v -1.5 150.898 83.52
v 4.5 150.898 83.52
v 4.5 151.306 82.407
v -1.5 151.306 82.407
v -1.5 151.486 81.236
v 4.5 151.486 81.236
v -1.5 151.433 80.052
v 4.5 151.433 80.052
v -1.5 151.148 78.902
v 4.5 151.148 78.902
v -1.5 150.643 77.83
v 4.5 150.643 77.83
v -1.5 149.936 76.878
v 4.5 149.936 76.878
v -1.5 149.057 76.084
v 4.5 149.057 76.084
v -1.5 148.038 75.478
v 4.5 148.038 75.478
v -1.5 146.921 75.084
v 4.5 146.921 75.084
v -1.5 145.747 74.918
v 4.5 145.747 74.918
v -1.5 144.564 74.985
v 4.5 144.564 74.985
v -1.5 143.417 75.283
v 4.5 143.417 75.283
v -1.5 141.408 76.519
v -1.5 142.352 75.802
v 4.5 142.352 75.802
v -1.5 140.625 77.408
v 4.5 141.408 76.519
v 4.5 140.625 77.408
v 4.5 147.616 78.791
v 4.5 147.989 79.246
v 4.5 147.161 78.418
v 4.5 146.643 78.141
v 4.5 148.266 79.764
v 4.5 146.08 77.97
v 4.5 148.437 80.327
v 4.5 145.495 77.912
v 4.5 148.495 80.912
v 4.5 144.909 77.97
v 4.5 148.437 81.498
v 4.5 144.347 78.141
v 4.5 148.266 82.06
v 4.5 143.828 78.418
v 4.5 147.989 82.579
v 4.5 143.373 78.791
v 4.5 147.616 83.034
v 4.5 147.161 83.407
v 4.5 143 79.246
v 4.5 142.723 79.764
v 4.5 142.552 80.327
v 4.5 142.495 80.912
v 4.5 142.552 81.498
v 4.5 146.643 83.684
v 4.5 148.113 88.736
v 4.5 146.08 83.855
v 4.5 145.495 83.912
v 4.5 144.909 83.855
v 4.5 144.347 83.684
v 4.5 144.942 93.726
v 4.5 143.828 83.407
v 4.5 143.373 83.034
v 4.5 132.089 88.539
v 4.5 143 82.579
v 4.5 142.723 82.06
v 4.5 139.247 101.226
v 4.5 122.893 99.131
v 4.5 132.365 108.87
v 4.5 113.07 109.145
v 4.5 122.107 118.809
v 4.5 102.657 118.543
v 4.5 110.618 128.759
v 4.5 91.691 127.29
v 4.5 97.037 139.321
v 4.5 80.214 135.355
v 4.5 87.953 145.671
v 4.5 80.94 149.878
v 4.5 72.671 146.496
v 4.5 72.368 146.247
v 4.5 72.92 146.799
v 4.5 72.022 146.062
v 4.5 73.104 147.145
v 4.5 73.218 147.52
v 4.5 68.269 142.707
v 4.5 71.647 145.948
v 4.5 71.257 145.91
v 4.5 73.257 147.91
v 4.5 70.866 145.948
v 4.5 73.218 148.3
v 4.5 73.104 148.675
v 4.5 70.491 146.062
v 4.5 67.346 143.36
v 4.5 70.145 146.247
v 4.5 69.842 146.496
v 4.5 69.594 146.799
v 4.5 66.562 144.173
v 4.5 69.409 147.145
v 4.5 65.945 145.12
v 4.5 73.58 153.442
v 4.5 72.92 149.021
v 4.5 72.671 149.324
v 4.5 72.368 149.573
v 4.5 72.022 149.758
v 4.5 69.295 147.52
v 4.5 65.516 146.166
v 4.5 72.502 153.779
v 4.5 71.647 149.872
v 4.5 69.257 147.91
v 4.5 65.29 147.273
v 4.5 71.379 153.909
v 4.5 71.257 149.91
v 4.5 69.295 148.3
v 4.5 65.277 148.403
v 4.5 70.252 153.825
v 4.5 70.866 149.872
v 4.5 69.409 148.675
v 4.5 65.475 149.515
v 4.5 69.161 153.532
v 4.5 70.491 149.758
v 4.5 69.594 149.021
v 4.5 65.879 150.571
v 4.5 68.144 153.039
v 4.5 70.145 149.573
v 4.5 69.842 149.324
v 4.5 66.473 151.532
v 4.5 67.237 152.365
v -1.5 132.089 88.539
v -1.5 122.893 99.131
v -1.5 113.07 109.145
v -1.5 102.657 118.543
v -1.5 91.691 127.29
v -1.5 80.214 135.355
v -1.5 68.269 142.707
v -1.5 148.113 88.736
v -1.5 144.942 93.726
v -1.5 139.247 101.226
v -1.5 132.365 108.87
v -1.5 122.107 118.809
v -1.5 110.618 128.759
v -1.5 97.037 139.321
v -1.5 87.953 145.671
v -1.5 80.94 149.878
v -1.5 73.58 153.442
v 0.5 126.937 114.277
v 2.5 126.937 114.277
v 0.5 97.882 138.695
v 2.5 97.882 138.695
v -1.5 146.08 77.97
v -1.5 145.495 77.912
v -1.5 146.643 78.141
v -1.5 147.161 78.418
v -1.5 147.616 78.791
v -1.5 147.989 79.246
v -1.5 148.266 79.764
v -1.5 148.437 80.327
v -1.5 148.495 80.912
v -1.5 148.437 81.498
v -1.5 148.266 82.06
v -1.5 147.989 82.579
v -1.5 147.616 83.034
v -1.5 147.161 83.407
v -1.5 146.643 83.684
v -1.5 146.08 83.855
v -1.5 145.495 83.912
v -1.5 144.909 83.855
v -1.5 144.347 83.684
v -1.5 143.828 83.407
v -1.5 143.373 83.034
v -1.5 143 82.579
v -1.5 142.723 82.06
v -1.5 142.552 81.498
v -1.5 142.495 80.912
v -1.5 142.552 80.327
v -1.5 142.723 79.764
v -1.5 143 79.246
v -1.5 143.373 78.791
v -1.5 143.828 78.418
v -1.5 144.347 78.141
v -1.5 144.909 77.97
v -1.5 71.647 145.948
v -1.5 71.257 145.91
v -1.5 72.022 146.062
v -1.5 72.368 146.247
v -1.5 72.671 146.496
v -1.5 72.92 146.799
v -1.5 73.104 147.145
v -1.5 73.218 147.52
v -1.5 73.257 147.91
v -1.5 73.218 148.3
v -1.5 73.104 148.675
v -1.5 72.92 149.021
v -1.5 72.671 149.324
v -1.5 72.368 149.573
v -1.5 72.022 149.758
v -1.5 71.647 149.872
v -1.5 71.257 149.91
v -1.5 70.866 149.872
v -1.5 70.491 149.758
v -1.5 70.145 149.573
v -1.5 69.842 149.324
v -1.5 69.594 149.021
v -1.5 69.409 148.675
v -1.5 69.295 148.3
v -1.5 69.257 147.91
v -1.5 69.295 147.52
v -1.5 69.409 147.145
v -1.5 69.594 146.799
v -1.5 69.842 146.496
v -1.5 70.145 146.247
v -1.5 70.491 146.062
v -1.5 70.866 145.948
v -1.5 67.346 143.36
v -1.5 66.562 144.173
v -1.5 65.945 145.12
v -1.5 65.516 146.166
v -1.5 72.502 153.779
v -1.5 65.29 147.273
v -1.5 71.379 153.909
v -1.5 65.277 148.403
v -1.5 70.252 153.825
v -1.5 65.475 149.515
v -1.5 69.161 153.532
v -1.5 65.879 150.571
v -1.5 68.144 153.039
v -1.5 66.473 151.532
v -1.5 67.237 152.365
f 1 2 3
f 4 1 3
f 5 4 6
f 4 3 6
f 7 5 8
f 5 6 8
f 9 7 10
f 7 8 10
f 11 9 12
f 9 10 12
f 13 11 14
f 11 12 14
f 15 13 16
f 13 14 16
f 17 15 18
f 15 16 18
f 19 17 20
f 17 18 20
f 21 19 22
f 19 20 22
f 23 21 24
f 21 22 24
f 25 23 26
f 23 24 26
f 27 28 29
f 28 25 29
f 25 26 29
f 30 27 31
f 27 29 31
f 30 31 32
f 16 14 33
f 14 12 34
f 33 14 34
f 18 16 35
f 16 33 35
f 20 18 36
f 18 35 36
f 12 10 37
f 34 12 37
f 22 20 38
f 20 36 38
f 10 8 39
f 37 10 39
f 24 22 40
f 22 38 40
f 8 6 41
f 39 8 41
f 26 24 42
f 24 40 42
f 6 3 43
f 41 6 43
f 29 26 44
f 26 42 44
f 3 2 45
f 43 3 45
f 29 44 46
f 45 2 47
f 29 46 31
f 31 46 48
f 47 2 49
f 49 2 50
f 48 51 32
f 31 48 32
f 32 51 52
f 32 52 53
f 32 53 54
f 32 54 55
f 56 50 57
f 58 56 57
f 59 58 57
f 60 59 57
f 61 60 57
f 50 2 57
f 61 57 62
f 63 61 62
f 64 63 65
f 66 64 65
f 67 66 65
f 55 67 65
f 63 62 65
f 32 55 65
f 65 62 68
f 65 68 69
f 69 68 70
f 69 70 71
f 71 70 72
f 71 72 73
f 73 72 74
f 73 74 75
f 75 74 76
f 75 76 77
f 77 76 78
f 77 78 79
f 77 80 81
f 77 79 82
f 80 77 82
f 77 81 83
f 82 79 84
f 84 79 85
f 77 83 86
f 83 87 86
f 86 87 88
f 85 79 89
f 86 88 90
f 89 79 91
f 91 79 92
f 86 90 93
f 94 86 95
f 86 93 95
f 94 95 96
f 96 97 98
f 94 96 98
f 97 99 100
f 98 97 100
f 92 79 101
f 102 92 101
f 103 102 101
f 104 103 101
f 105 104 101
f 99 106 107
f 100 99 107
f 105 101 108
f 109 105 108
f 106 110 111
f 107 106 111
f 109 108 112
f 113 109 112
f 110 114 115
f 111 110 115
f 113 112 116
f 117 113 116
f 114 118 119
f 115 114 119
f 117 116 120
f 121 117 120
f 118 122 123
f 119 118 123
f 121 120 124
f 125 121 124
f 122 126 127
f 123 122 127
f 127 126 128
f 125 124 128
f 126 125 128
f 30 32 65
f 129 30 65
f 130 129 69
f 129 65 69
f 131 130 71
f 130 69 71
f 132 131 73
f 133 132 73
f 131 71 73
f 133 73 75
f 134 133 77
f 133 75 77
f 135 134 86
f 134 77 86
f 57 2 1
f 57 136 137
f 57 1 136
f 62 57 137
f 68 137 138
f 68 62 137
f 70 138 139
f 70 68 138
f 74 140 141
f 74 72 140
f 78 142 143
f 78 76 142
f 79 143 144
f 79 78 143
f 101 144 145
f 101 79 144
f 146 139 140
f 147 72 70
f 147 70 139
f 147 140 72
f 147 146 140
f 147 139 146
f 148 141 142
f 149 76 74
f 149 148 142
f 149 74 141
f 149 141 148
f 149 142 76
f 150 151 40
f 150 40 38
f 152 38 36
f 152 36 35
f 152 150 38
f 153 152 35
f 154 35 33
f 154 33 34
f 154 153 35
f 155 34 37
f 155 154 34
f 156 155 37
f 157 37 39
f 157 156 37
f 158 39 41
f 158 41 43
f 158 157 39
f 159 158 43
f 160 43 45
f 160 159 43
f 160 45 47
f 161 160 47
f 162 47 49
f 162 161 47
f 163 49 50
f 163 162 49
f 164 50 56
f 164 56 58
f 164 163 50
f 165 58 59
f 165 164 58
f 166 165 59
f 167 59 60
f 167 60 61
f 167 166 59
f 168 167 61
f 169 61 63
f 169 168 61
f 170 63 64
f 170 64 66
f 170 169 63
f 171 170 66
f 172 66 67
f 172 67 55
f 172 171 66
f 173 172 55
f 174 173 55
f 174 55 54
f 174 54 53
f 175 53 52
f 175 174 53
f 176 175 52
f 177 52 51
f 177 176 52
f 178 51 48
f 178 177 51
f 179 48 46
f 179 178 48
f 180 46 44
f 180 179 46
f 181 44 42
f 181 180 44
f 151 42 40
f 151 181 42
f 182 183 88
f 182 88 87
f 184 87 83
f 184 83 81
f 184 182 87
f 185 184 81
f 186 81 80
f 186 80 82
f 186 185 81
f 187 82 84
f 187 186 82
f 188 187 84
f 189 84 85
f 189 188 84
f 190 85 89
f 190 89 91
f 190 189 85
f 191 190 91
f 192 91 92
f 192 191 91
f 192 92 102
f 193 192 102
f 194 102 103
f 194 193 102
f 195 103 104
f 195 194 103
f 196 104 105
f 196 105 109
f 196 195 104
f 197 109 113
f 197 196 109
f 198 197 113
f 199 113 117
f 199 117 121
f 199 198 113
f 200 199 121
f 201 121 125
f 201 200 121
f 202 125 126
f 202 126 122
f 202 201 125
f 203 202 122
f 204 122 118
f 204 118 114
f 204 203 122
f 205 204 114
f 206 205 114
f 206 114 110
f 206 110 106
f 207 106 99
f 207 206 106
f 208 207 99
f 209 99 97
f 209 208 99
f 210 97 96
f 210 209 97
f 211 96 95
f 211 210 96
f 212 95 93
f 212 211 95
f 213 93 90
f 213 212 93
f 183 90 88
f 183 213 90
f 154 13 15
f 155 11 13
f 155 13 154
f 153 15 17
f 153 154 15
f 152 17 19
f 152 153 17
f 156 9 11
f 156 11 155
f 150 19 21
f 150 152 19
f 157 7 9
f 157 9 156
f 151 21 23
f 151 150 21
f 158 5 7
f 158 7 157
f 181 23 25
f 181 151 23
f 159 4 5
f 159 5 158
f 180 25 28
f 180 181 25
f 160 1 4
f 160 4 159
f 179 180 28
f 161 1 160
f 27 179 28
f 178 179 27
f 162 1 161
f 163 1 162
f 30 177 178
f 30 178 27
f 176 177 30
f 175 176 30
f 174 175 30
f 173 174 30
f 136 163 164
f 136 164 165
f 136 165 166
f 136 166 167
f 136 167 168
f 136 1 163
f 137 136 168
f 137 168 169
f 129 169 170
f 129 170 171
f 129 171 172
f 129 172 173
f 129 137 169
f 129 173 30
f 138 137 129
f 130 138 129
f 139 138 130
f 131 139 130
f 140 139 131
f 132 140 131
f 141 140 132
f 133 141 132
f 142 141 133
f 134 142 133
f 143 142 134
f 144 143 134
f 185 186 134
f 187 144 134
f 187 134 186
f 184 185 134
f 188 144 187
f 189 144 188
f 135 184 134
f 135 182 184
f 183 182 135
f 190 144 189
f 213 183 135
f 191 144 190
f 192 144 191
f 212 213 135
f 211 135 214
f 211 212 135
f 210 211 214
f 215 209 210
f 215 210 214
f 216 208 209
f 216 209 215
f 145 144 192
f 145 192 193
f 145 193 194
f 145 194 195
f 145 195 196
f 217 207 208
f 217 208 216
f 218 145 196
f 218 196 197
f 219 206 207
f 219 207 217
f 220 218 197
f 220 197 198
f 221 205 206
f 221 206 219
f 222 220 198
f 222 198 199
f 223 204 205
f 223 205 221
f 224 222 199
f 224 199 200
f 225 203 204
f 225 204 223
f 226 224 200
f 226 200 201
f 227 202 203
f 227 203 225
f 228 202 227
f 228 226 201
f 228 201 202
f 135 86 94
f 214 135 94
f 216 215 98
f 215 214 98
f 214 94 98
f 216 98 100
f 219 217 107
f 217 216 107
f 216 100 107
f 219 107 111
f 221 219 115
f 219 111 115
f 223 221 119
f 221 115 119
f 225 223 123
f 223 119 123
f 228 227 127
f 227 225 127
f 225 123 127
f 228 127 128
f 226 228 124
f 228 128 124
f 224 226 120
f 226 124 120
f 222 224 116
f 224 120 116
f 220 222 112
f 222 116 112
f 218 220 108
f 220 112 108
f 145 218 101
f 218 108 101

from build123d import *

# Parameters (mm, degrees)
SKETCH3_R               = 1.5
SKETCH3_R_2             = 1
BOSS_EXTRUDE2_DEPTH     = 3
SCALE1_SCALE            = 2
CUT_EXTRUDE1_DEPTH      = 236.835290083
CUT_EXTRUDE1_DEPTH_BACK = 236.835290083


with BuildPart() as part:
    # Sketch3 → Boss-Extrude2 (new body)
    with BuildSketch(Plane.YZ):
        with BuildLine():
            ThreePointArc((118.150026657, 100.656257205), (107.173519636, 113.210773098), (93.56234312, 122.845888539))
            ThreePointArc((93.56234312, 122.845888539), (81.890744338, 136.842623997), (100.108836706, 136.356895566))
            ThreePointArc((100.108836706, 136.356895566), (117.223173705, 124.346501771), (130.920746245, 108.550090897))
            ThreePointArc((130.920746245, 108.550090897), (133.266943269, 90.477177984), (118.150026657, 100.656257205))
        make_face()
        with Locations(Location((128.009104434, 98.9833599, 0), (0, 0, 270))):
            Circle(SKETCH3_R, mode=Mode.SUBTRACT)
        with Locations(Location((90.890008855, 132.482206797, 0), (0, 0, 270))):
            Circle(SKETCH3_R_2, mode=Mode.SUBTRACT)
    extrude(amount=BOSS_EXTRUDE2_DEPTH)


with BuildPart() as part_1:
    # Scale1: scaled about (1.5, 110.52343824, 117.054422993)
    add(part.part.scale(SCALE1_SCALE).moved(Location((-1.5, -110.52343824, -117.054422993))))

    # Sketch4 → Cut-Extrude1 (cut, two sides: drawn at the far end of the back side and taken through both)
    # profile 1 of 2: a face of its own
    with BuildSketch(Plane(origin=(-1.5, 0, 0), x_dir=(0, -1, 0), z_dir=(-1, 0, 0)).offset(-CUT_EXTRUDE1_DEPTH_BACK)):
        with BuildLine():
            ThreePointArc((-97.213316268, 162.951526918), (-130.622678549, 139.062399665), (-157.803069224, 108.271130585))
            ThreePointArc((-157.803069224, 108.271130585), (-161.544389081, 55.566493456), (-115.500216043, 81.48386945))
            ThreePointArc((-115.500216043, 81.48386945), (-97.123831652, 101.943304086), (-74.892452954, 118.131131925))
            ThreePointArc((-74.892452954, 118.131131925), (-44.402388035, 161.28356164), (-97.213316268, 162.951526918))
        make_face()
        with BuildLine():
            ThreePointArc((-125.776615074, 84.258091416), (-103.823601031, 109.367123202), (-76.601248, 128.637354084))
            ThreePointArc((-76.601248, 128.637354084), (-53.258050437, 156.630825002), (-89.694235172, 155.659368138))
            ThreePointArc((-89.694235172, 155.659368138), (-123.922909169, 131.638580549), (-151.318054249, 100.045758801))
            ThreePointArc((-151.318054249, 100.045758801), (-156.010448298, 63.899932976), (-125.776615074, 84.258091416))
        make_face(mode=Mode.SUBTRACT)
    # profile 2 of 2: a face of its own
    with BuildSketch(Plane(origin=(-1.5, 0, 0), x_dir=(0, -1, 0), z_dir=(-1, 0, 0)).offset(-CUT_EXTRUDE1_DEPTH_BACK)):
        with BuildLine():
            ThreePointArc((-151.318054249, 100.045758801), (-156.010448298, 63.899932976), (-125.776615074, 84.258091416))
            ThreePointArc((-125.776615074, 84.258091416), (-103.823601031, 109.367123202), (-76.601248, 128.637354084))
            ThreePointArc((-76.601248, 128.637354084), (-53.258050437, 156.630825002), (-89.694235172, 155.659368138))
            ThreePointArc((-89.694235172, 155.659368138), (-123.922909169, 131.638580549), (-151.318054249, 100.045758801))
        make_face()
        with BuildLine():
            ThreePointArc((-150.898316566, 83.520302039), (-148.562598659, 75.755899696), (-140.624556205, 77.407869396))
            ThreePointArc((-140.624556205, 77.407869396), (-107.93501235, 113.922858215), (-68.268560869, 142.706939107))
            ThreePointArc((-68.268560869, 142.706939107), (-65.87894024, 150.571004751), (-73.580432021, 153.441691001))
            add(Edge.make_bspline(
                [(-150.898316566, 83.520302039), (-145.205189888, 95.315934641), (-127.744788656, 114.843857064), (-100.777949871, 137.161096472), (-82.38983998, 149.740882267), (-73.580432021, 153.441691001)],
                knots=[0, 0, 0, 0, 0.370027271, 0.730223157, 1, 1, 1, 1], degree=3))
        make_face(mode=Mode.SUBTRACT)
    extrude(amount=CUT_EXTRUDE1_DEPTH + CUT_EXTRUDE1_DEPTH_BACK, mode=Mode.SUBTRACT)


solid = part_1.part
